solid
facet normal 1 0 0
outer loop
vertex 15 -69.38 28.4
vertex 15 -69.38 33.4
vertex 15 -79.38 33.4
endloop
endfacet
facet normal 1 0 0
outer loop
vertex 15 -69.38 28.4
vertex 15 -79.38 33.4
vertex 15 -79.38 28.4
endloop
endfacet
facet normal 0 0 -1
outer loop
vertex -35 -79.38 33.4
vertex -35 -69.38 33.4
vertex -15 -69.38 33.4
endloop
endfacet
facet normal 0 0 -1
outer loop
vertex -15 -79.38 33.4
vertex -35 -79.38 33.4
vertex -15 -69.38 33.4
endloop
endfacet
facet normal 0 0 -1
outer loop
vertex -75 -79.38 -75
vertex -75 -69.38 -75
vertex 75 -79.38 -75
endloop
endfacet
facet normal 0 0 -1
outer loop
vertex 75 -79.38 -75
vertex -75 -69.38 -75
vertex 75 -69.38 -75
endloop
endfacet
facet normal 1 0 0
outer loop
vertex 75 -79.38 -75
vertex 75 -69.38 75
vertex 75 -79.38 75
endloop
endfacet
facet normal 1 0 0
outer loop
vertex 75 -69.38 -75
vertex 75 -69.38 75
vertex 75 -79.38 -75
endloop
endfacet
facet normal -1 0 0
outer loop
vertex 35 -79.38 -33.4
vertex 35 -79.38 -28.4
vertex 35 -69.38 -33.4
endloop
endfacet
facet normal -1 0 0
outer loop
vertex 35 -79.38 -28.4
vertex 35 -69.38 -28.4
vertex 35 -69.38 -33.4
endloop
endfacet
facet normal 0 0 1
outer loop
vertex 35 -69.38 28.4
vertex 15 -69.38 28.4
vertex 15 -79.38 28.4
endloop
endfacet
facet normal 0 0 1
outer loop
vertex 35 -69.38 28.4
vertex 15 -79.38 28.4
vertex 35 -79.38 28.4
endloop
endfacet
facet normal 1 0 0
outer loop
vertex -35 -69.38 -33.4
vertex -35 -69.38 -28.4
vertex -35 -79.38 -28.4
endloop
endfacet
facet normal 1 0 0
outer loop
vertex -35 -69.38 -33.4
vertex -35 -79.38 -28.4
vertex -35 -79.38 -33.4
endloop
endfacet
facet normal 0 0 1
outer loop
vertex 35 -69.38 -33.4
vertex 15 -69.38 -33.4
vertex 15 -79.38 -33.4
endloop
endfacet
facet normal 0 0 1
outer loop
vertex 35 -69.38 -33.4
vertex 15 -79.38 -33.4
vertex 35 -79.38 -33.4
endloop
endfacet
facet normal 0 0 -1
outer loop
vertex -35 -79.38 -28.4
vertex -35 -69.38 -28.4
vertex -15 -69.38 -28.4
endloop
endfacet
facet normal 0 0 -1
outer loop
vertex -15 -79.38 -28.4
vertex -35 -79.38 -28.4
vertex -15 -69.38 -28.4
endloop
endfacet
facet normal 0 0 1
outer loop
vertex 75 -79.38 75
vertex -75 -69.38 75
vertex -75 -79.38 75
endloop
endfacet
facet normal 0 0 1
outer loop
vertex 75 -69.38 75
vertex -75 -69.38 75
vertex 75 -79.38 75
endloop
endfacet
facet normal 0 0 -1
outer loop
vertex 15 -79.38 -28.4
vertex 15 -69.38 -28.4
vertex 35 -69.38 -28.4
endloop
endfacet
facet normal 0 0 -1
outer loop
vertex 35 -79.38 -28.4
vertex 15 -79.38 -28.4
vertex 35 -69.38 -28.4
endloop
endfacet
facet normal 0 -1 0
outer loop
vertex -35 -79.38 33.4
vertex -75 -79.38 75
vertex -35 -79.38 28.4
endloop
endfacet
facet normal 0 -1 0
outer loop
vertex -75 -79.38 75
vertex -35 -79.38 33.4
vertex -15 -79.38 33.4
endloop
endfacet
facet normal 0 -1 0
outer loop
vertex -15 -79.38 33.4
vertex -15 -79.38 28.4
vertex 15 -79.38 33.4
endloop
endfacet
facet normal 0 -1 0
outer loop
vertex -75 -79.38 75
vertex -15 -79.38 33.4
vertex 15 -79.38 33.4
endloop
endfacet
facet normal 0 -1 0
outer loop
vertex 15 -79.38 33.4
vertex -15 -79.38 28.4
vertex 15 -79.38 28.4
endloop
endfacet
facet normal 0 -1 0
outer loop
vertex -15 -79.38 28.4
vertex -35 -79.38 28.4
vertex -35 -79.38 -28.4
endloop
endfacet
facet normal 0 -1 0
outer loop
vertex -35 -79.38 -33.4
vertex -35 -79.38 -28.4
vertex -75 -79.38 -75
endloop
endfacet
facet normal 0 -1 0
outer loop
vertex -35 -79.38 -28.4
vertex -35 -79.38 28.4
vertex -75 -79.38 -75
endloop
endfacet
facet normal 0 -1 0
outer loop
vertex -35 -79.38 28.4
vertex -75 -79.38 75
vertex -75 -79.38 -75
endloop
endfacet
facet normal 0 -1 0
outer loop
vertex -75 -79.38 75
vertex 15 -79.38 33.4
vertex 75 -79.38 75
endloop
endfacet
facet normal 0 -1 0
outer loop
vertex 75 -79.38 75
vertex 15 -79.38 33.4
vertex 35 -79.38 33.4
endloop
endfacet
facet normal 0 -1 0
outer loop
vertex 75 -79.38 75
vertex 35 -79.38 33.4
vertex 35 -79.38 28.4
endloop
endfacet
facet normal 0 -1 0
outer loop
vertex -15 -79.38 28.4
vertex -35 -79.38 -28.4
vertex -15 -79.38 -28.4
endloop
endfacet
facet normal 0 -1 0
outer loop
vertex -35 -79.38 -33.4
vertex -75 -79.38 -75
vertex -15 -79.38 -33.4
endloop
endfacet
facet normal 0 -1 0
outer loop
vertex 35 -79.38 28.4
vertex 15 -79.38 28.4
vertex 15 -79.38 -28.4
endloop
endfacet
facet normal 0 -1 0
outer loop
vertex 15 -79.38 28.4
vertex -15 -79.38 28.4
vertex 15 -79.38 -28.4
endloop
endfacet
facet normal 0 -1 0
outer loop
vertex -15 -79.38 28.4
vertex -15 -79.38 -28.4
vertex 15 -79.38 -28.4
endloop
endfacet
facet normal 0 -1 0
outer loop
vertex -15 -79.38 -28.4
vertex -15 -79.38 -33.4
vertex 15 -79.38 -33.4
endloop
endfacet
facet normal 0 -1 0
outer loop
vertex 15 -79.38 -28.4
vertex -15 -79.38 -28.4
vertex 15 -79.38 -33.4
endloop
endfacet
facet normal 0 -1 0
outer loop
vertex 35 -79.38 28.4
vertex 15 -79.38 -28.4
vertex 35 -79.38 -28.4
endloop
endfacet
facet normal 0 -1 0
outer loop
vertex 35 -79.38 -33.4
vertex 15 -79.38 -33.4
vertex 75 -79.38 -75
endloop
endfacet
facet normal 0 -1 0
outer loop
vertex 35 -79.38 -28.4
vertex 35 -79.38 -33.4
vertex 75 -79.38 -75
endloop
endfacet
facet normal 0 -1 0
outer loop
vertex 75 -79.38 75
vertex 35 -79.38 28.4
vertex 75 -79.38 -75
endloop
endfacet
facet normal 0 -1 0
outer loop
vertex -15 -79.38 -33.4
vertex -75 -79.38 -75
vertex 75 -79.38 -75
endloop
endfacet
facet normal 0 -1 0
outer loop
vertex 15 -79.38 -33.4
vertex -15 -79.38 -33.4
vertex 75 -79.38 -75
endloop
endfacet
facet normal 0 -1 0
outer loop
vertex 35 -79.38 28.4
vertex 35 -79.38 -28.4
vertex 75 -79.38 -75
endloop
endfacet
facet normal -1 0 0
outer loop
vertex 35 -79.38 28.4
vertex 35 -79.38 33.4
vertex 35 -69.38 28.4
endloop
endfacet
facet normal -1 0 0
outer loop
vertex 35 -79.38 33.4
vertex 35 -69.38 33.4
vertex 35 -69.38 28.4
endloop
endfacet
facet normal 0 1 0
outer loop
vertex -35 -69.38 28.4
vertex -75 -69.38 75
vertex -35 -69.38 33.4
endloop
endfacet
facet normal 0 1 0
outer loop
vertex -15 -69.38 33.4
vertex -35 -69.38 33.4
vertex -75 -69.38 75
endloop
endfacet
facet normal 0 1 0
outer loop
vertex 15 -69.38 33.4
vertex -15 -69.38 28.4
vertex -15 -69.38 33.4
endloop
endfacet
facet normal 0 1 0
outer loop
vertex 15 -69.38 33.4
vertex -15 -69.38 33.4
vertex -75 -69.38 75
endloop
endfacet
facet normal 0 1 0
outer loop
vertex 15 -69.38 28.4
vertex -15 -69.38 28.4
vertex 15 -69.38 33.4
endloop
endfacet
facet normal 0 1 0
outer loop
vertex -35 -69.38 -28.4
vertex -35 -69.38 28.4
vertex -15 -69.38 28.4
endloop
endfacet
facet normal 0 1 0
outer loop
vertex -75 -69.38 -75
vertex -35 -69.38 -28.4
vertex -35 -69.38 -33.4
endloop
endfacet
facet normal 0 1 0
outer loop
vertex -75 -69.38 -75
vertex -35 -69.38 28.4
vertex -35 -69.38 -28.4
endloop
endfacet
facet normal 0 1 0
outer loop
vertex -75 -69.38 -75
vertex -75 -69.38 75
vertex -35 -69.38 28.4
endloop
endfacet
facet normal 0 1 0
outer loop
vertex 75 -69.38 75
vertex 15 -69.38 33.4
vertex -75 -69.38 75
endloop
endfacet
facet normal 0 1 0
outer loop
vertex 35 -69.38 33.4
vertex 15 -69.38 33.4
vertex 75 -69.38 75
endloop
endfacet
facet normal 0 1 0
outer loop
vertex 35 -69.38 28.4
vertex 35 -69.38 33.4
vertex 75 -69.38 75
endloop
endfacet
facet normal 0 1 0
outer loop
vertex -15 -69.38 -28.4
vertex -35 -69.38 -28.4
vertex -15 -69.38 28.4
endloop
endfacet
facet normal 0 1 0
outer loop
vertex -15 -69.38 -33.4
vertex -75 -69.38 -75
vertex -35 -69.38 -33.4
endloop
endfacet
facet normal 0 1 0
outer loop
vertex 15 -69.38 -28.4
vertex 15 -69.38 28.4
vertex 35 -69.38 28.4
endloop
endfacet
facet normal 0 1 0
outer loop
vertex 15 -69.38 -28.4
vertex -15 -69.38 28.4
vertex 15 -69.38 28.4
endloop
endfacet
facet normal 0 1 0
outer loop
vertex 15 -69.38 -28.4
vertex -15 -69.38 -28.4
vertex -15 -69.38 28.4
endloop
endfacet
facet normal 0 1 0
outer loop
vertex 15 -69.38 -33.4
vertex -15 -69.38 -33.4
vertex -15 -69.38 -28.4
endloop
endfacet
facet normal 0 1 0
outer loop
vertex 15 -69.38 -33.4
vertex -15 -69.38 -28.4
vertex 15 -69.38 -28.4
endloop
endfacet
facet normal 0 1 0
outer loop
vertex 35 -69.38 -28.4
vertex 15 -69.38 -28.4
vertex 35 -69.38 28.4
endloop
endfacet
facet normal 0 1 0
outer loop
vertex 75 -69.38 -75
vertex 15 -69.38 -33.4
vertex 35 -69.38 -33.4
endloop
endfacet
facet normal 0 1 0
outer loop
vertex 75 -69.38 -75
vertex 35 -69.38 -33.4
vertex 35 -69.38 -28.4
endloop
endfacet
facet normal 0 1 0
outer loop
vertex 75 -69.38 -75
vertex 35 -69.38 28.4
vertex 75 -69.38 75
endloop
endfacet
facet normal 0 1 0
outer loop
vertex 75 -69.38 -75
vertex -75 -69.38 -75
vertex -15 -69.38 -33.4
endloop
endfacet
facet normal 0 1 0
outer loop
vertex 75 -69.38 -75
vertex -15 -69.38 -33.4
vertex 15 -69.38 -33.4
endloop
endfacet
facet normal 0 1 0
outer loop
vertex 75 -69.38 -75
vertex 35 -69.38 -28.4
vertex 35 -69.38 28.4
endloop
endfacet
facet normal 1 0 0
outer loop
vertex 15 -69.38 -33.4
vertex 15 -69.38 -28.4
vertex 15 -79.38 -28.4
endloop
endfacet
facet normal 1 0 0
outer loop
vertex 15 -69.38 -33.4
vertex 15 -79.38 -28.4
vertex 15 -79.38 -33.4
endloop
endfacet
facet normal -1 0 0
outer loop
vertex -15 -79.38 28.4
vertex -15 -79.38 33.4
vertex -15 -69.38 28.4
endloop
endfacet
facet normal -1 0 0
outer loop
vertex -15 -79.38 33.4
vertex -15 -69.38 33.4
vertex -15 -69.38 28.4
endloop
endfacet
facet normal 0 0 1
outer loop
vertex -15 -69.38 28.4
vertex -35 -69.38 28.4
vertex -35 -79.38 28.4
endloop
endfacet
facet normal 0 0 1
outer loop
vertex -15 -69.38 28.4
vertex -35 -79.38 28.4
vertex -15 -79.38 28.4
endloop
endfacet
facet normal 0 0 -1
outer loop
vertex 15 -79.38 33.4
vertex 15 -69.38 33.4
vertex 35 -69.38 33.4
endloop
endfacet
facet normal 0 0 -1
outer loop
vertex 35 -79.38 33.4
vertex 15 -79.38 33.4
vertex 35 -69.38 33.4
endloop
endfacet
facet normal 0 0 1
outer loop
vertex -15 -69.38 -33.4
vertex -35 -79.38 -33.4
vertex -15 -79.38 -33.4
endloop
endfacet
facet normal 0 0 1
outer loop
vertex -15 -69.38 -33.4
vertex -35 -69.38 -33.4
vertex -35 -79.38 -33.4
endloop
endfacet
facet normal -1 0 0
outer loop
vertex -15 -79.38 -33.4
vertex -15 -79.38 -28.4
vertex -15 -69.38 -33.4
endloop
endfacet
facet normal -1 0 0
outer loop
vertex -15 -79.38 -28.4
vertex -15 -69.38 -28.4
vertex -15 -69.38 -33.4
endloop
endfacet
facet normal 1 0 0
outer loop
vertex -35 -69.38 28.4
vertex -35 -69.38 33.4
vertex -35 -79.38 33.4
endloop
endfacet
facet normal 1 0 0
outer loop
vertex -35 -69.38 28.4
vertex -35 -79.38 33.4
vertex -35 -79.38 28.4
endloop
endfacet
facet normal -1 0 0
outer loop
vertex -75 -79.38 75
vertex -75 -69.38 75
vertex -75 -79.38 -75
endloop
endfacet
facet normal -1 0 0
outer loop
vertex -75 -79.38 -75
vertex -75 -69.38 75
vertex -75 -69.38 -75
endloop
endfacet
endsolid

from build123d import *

# Parameters (mm, degrees)
SKETCH15_W          = 150
SKETCH15_H          = 150
SKETCH15_W_2        = 20
SKETCH15_H_2        = 5
BOSS_EXTRUDE1_DEPTH = 5


with BuildPart() as part:
    # Sketch15 → Boss-Extrude1 (new, symmetric)
    with BuildSketch(Plane(origin=(0, 0, 0), x_dir=(1, 0, 0), z_dir=(0, 1, 0))):
        Rectangle(SKETCH15_W, SKETCH15_H)
        with Locations((-25, -30.9)):
            Rectangle(SKETCH15_W_2, SKETCH15_H_2, mode=Mode.SUBTRACT)
        with Locations((25, -30.9)):
            Rectangle(SKETCH15_W_2, SKETCH15_H_2, mode=Mode.SUBTRACT)
        with Locations((25, 30.9)):
            Rectangle(SKETCH15_W_2, SKETCH15_H_2, mode=Mode.SUBTRACT)
        with Locations((-25, 30.9)):
            Rectangle(SKETCH15_W_2, SKETCH15_H_2, mode=Mode.SUBTRACT)
    extrude(amount=BOSS_EXTRUDE1_DEPTH, both=True)


with BuildPart() as part_1:
    # Body-Move/Copy1: moved
    add(part.part.moved(Location((0, -74.38, 0))))


solid = part_1.part
